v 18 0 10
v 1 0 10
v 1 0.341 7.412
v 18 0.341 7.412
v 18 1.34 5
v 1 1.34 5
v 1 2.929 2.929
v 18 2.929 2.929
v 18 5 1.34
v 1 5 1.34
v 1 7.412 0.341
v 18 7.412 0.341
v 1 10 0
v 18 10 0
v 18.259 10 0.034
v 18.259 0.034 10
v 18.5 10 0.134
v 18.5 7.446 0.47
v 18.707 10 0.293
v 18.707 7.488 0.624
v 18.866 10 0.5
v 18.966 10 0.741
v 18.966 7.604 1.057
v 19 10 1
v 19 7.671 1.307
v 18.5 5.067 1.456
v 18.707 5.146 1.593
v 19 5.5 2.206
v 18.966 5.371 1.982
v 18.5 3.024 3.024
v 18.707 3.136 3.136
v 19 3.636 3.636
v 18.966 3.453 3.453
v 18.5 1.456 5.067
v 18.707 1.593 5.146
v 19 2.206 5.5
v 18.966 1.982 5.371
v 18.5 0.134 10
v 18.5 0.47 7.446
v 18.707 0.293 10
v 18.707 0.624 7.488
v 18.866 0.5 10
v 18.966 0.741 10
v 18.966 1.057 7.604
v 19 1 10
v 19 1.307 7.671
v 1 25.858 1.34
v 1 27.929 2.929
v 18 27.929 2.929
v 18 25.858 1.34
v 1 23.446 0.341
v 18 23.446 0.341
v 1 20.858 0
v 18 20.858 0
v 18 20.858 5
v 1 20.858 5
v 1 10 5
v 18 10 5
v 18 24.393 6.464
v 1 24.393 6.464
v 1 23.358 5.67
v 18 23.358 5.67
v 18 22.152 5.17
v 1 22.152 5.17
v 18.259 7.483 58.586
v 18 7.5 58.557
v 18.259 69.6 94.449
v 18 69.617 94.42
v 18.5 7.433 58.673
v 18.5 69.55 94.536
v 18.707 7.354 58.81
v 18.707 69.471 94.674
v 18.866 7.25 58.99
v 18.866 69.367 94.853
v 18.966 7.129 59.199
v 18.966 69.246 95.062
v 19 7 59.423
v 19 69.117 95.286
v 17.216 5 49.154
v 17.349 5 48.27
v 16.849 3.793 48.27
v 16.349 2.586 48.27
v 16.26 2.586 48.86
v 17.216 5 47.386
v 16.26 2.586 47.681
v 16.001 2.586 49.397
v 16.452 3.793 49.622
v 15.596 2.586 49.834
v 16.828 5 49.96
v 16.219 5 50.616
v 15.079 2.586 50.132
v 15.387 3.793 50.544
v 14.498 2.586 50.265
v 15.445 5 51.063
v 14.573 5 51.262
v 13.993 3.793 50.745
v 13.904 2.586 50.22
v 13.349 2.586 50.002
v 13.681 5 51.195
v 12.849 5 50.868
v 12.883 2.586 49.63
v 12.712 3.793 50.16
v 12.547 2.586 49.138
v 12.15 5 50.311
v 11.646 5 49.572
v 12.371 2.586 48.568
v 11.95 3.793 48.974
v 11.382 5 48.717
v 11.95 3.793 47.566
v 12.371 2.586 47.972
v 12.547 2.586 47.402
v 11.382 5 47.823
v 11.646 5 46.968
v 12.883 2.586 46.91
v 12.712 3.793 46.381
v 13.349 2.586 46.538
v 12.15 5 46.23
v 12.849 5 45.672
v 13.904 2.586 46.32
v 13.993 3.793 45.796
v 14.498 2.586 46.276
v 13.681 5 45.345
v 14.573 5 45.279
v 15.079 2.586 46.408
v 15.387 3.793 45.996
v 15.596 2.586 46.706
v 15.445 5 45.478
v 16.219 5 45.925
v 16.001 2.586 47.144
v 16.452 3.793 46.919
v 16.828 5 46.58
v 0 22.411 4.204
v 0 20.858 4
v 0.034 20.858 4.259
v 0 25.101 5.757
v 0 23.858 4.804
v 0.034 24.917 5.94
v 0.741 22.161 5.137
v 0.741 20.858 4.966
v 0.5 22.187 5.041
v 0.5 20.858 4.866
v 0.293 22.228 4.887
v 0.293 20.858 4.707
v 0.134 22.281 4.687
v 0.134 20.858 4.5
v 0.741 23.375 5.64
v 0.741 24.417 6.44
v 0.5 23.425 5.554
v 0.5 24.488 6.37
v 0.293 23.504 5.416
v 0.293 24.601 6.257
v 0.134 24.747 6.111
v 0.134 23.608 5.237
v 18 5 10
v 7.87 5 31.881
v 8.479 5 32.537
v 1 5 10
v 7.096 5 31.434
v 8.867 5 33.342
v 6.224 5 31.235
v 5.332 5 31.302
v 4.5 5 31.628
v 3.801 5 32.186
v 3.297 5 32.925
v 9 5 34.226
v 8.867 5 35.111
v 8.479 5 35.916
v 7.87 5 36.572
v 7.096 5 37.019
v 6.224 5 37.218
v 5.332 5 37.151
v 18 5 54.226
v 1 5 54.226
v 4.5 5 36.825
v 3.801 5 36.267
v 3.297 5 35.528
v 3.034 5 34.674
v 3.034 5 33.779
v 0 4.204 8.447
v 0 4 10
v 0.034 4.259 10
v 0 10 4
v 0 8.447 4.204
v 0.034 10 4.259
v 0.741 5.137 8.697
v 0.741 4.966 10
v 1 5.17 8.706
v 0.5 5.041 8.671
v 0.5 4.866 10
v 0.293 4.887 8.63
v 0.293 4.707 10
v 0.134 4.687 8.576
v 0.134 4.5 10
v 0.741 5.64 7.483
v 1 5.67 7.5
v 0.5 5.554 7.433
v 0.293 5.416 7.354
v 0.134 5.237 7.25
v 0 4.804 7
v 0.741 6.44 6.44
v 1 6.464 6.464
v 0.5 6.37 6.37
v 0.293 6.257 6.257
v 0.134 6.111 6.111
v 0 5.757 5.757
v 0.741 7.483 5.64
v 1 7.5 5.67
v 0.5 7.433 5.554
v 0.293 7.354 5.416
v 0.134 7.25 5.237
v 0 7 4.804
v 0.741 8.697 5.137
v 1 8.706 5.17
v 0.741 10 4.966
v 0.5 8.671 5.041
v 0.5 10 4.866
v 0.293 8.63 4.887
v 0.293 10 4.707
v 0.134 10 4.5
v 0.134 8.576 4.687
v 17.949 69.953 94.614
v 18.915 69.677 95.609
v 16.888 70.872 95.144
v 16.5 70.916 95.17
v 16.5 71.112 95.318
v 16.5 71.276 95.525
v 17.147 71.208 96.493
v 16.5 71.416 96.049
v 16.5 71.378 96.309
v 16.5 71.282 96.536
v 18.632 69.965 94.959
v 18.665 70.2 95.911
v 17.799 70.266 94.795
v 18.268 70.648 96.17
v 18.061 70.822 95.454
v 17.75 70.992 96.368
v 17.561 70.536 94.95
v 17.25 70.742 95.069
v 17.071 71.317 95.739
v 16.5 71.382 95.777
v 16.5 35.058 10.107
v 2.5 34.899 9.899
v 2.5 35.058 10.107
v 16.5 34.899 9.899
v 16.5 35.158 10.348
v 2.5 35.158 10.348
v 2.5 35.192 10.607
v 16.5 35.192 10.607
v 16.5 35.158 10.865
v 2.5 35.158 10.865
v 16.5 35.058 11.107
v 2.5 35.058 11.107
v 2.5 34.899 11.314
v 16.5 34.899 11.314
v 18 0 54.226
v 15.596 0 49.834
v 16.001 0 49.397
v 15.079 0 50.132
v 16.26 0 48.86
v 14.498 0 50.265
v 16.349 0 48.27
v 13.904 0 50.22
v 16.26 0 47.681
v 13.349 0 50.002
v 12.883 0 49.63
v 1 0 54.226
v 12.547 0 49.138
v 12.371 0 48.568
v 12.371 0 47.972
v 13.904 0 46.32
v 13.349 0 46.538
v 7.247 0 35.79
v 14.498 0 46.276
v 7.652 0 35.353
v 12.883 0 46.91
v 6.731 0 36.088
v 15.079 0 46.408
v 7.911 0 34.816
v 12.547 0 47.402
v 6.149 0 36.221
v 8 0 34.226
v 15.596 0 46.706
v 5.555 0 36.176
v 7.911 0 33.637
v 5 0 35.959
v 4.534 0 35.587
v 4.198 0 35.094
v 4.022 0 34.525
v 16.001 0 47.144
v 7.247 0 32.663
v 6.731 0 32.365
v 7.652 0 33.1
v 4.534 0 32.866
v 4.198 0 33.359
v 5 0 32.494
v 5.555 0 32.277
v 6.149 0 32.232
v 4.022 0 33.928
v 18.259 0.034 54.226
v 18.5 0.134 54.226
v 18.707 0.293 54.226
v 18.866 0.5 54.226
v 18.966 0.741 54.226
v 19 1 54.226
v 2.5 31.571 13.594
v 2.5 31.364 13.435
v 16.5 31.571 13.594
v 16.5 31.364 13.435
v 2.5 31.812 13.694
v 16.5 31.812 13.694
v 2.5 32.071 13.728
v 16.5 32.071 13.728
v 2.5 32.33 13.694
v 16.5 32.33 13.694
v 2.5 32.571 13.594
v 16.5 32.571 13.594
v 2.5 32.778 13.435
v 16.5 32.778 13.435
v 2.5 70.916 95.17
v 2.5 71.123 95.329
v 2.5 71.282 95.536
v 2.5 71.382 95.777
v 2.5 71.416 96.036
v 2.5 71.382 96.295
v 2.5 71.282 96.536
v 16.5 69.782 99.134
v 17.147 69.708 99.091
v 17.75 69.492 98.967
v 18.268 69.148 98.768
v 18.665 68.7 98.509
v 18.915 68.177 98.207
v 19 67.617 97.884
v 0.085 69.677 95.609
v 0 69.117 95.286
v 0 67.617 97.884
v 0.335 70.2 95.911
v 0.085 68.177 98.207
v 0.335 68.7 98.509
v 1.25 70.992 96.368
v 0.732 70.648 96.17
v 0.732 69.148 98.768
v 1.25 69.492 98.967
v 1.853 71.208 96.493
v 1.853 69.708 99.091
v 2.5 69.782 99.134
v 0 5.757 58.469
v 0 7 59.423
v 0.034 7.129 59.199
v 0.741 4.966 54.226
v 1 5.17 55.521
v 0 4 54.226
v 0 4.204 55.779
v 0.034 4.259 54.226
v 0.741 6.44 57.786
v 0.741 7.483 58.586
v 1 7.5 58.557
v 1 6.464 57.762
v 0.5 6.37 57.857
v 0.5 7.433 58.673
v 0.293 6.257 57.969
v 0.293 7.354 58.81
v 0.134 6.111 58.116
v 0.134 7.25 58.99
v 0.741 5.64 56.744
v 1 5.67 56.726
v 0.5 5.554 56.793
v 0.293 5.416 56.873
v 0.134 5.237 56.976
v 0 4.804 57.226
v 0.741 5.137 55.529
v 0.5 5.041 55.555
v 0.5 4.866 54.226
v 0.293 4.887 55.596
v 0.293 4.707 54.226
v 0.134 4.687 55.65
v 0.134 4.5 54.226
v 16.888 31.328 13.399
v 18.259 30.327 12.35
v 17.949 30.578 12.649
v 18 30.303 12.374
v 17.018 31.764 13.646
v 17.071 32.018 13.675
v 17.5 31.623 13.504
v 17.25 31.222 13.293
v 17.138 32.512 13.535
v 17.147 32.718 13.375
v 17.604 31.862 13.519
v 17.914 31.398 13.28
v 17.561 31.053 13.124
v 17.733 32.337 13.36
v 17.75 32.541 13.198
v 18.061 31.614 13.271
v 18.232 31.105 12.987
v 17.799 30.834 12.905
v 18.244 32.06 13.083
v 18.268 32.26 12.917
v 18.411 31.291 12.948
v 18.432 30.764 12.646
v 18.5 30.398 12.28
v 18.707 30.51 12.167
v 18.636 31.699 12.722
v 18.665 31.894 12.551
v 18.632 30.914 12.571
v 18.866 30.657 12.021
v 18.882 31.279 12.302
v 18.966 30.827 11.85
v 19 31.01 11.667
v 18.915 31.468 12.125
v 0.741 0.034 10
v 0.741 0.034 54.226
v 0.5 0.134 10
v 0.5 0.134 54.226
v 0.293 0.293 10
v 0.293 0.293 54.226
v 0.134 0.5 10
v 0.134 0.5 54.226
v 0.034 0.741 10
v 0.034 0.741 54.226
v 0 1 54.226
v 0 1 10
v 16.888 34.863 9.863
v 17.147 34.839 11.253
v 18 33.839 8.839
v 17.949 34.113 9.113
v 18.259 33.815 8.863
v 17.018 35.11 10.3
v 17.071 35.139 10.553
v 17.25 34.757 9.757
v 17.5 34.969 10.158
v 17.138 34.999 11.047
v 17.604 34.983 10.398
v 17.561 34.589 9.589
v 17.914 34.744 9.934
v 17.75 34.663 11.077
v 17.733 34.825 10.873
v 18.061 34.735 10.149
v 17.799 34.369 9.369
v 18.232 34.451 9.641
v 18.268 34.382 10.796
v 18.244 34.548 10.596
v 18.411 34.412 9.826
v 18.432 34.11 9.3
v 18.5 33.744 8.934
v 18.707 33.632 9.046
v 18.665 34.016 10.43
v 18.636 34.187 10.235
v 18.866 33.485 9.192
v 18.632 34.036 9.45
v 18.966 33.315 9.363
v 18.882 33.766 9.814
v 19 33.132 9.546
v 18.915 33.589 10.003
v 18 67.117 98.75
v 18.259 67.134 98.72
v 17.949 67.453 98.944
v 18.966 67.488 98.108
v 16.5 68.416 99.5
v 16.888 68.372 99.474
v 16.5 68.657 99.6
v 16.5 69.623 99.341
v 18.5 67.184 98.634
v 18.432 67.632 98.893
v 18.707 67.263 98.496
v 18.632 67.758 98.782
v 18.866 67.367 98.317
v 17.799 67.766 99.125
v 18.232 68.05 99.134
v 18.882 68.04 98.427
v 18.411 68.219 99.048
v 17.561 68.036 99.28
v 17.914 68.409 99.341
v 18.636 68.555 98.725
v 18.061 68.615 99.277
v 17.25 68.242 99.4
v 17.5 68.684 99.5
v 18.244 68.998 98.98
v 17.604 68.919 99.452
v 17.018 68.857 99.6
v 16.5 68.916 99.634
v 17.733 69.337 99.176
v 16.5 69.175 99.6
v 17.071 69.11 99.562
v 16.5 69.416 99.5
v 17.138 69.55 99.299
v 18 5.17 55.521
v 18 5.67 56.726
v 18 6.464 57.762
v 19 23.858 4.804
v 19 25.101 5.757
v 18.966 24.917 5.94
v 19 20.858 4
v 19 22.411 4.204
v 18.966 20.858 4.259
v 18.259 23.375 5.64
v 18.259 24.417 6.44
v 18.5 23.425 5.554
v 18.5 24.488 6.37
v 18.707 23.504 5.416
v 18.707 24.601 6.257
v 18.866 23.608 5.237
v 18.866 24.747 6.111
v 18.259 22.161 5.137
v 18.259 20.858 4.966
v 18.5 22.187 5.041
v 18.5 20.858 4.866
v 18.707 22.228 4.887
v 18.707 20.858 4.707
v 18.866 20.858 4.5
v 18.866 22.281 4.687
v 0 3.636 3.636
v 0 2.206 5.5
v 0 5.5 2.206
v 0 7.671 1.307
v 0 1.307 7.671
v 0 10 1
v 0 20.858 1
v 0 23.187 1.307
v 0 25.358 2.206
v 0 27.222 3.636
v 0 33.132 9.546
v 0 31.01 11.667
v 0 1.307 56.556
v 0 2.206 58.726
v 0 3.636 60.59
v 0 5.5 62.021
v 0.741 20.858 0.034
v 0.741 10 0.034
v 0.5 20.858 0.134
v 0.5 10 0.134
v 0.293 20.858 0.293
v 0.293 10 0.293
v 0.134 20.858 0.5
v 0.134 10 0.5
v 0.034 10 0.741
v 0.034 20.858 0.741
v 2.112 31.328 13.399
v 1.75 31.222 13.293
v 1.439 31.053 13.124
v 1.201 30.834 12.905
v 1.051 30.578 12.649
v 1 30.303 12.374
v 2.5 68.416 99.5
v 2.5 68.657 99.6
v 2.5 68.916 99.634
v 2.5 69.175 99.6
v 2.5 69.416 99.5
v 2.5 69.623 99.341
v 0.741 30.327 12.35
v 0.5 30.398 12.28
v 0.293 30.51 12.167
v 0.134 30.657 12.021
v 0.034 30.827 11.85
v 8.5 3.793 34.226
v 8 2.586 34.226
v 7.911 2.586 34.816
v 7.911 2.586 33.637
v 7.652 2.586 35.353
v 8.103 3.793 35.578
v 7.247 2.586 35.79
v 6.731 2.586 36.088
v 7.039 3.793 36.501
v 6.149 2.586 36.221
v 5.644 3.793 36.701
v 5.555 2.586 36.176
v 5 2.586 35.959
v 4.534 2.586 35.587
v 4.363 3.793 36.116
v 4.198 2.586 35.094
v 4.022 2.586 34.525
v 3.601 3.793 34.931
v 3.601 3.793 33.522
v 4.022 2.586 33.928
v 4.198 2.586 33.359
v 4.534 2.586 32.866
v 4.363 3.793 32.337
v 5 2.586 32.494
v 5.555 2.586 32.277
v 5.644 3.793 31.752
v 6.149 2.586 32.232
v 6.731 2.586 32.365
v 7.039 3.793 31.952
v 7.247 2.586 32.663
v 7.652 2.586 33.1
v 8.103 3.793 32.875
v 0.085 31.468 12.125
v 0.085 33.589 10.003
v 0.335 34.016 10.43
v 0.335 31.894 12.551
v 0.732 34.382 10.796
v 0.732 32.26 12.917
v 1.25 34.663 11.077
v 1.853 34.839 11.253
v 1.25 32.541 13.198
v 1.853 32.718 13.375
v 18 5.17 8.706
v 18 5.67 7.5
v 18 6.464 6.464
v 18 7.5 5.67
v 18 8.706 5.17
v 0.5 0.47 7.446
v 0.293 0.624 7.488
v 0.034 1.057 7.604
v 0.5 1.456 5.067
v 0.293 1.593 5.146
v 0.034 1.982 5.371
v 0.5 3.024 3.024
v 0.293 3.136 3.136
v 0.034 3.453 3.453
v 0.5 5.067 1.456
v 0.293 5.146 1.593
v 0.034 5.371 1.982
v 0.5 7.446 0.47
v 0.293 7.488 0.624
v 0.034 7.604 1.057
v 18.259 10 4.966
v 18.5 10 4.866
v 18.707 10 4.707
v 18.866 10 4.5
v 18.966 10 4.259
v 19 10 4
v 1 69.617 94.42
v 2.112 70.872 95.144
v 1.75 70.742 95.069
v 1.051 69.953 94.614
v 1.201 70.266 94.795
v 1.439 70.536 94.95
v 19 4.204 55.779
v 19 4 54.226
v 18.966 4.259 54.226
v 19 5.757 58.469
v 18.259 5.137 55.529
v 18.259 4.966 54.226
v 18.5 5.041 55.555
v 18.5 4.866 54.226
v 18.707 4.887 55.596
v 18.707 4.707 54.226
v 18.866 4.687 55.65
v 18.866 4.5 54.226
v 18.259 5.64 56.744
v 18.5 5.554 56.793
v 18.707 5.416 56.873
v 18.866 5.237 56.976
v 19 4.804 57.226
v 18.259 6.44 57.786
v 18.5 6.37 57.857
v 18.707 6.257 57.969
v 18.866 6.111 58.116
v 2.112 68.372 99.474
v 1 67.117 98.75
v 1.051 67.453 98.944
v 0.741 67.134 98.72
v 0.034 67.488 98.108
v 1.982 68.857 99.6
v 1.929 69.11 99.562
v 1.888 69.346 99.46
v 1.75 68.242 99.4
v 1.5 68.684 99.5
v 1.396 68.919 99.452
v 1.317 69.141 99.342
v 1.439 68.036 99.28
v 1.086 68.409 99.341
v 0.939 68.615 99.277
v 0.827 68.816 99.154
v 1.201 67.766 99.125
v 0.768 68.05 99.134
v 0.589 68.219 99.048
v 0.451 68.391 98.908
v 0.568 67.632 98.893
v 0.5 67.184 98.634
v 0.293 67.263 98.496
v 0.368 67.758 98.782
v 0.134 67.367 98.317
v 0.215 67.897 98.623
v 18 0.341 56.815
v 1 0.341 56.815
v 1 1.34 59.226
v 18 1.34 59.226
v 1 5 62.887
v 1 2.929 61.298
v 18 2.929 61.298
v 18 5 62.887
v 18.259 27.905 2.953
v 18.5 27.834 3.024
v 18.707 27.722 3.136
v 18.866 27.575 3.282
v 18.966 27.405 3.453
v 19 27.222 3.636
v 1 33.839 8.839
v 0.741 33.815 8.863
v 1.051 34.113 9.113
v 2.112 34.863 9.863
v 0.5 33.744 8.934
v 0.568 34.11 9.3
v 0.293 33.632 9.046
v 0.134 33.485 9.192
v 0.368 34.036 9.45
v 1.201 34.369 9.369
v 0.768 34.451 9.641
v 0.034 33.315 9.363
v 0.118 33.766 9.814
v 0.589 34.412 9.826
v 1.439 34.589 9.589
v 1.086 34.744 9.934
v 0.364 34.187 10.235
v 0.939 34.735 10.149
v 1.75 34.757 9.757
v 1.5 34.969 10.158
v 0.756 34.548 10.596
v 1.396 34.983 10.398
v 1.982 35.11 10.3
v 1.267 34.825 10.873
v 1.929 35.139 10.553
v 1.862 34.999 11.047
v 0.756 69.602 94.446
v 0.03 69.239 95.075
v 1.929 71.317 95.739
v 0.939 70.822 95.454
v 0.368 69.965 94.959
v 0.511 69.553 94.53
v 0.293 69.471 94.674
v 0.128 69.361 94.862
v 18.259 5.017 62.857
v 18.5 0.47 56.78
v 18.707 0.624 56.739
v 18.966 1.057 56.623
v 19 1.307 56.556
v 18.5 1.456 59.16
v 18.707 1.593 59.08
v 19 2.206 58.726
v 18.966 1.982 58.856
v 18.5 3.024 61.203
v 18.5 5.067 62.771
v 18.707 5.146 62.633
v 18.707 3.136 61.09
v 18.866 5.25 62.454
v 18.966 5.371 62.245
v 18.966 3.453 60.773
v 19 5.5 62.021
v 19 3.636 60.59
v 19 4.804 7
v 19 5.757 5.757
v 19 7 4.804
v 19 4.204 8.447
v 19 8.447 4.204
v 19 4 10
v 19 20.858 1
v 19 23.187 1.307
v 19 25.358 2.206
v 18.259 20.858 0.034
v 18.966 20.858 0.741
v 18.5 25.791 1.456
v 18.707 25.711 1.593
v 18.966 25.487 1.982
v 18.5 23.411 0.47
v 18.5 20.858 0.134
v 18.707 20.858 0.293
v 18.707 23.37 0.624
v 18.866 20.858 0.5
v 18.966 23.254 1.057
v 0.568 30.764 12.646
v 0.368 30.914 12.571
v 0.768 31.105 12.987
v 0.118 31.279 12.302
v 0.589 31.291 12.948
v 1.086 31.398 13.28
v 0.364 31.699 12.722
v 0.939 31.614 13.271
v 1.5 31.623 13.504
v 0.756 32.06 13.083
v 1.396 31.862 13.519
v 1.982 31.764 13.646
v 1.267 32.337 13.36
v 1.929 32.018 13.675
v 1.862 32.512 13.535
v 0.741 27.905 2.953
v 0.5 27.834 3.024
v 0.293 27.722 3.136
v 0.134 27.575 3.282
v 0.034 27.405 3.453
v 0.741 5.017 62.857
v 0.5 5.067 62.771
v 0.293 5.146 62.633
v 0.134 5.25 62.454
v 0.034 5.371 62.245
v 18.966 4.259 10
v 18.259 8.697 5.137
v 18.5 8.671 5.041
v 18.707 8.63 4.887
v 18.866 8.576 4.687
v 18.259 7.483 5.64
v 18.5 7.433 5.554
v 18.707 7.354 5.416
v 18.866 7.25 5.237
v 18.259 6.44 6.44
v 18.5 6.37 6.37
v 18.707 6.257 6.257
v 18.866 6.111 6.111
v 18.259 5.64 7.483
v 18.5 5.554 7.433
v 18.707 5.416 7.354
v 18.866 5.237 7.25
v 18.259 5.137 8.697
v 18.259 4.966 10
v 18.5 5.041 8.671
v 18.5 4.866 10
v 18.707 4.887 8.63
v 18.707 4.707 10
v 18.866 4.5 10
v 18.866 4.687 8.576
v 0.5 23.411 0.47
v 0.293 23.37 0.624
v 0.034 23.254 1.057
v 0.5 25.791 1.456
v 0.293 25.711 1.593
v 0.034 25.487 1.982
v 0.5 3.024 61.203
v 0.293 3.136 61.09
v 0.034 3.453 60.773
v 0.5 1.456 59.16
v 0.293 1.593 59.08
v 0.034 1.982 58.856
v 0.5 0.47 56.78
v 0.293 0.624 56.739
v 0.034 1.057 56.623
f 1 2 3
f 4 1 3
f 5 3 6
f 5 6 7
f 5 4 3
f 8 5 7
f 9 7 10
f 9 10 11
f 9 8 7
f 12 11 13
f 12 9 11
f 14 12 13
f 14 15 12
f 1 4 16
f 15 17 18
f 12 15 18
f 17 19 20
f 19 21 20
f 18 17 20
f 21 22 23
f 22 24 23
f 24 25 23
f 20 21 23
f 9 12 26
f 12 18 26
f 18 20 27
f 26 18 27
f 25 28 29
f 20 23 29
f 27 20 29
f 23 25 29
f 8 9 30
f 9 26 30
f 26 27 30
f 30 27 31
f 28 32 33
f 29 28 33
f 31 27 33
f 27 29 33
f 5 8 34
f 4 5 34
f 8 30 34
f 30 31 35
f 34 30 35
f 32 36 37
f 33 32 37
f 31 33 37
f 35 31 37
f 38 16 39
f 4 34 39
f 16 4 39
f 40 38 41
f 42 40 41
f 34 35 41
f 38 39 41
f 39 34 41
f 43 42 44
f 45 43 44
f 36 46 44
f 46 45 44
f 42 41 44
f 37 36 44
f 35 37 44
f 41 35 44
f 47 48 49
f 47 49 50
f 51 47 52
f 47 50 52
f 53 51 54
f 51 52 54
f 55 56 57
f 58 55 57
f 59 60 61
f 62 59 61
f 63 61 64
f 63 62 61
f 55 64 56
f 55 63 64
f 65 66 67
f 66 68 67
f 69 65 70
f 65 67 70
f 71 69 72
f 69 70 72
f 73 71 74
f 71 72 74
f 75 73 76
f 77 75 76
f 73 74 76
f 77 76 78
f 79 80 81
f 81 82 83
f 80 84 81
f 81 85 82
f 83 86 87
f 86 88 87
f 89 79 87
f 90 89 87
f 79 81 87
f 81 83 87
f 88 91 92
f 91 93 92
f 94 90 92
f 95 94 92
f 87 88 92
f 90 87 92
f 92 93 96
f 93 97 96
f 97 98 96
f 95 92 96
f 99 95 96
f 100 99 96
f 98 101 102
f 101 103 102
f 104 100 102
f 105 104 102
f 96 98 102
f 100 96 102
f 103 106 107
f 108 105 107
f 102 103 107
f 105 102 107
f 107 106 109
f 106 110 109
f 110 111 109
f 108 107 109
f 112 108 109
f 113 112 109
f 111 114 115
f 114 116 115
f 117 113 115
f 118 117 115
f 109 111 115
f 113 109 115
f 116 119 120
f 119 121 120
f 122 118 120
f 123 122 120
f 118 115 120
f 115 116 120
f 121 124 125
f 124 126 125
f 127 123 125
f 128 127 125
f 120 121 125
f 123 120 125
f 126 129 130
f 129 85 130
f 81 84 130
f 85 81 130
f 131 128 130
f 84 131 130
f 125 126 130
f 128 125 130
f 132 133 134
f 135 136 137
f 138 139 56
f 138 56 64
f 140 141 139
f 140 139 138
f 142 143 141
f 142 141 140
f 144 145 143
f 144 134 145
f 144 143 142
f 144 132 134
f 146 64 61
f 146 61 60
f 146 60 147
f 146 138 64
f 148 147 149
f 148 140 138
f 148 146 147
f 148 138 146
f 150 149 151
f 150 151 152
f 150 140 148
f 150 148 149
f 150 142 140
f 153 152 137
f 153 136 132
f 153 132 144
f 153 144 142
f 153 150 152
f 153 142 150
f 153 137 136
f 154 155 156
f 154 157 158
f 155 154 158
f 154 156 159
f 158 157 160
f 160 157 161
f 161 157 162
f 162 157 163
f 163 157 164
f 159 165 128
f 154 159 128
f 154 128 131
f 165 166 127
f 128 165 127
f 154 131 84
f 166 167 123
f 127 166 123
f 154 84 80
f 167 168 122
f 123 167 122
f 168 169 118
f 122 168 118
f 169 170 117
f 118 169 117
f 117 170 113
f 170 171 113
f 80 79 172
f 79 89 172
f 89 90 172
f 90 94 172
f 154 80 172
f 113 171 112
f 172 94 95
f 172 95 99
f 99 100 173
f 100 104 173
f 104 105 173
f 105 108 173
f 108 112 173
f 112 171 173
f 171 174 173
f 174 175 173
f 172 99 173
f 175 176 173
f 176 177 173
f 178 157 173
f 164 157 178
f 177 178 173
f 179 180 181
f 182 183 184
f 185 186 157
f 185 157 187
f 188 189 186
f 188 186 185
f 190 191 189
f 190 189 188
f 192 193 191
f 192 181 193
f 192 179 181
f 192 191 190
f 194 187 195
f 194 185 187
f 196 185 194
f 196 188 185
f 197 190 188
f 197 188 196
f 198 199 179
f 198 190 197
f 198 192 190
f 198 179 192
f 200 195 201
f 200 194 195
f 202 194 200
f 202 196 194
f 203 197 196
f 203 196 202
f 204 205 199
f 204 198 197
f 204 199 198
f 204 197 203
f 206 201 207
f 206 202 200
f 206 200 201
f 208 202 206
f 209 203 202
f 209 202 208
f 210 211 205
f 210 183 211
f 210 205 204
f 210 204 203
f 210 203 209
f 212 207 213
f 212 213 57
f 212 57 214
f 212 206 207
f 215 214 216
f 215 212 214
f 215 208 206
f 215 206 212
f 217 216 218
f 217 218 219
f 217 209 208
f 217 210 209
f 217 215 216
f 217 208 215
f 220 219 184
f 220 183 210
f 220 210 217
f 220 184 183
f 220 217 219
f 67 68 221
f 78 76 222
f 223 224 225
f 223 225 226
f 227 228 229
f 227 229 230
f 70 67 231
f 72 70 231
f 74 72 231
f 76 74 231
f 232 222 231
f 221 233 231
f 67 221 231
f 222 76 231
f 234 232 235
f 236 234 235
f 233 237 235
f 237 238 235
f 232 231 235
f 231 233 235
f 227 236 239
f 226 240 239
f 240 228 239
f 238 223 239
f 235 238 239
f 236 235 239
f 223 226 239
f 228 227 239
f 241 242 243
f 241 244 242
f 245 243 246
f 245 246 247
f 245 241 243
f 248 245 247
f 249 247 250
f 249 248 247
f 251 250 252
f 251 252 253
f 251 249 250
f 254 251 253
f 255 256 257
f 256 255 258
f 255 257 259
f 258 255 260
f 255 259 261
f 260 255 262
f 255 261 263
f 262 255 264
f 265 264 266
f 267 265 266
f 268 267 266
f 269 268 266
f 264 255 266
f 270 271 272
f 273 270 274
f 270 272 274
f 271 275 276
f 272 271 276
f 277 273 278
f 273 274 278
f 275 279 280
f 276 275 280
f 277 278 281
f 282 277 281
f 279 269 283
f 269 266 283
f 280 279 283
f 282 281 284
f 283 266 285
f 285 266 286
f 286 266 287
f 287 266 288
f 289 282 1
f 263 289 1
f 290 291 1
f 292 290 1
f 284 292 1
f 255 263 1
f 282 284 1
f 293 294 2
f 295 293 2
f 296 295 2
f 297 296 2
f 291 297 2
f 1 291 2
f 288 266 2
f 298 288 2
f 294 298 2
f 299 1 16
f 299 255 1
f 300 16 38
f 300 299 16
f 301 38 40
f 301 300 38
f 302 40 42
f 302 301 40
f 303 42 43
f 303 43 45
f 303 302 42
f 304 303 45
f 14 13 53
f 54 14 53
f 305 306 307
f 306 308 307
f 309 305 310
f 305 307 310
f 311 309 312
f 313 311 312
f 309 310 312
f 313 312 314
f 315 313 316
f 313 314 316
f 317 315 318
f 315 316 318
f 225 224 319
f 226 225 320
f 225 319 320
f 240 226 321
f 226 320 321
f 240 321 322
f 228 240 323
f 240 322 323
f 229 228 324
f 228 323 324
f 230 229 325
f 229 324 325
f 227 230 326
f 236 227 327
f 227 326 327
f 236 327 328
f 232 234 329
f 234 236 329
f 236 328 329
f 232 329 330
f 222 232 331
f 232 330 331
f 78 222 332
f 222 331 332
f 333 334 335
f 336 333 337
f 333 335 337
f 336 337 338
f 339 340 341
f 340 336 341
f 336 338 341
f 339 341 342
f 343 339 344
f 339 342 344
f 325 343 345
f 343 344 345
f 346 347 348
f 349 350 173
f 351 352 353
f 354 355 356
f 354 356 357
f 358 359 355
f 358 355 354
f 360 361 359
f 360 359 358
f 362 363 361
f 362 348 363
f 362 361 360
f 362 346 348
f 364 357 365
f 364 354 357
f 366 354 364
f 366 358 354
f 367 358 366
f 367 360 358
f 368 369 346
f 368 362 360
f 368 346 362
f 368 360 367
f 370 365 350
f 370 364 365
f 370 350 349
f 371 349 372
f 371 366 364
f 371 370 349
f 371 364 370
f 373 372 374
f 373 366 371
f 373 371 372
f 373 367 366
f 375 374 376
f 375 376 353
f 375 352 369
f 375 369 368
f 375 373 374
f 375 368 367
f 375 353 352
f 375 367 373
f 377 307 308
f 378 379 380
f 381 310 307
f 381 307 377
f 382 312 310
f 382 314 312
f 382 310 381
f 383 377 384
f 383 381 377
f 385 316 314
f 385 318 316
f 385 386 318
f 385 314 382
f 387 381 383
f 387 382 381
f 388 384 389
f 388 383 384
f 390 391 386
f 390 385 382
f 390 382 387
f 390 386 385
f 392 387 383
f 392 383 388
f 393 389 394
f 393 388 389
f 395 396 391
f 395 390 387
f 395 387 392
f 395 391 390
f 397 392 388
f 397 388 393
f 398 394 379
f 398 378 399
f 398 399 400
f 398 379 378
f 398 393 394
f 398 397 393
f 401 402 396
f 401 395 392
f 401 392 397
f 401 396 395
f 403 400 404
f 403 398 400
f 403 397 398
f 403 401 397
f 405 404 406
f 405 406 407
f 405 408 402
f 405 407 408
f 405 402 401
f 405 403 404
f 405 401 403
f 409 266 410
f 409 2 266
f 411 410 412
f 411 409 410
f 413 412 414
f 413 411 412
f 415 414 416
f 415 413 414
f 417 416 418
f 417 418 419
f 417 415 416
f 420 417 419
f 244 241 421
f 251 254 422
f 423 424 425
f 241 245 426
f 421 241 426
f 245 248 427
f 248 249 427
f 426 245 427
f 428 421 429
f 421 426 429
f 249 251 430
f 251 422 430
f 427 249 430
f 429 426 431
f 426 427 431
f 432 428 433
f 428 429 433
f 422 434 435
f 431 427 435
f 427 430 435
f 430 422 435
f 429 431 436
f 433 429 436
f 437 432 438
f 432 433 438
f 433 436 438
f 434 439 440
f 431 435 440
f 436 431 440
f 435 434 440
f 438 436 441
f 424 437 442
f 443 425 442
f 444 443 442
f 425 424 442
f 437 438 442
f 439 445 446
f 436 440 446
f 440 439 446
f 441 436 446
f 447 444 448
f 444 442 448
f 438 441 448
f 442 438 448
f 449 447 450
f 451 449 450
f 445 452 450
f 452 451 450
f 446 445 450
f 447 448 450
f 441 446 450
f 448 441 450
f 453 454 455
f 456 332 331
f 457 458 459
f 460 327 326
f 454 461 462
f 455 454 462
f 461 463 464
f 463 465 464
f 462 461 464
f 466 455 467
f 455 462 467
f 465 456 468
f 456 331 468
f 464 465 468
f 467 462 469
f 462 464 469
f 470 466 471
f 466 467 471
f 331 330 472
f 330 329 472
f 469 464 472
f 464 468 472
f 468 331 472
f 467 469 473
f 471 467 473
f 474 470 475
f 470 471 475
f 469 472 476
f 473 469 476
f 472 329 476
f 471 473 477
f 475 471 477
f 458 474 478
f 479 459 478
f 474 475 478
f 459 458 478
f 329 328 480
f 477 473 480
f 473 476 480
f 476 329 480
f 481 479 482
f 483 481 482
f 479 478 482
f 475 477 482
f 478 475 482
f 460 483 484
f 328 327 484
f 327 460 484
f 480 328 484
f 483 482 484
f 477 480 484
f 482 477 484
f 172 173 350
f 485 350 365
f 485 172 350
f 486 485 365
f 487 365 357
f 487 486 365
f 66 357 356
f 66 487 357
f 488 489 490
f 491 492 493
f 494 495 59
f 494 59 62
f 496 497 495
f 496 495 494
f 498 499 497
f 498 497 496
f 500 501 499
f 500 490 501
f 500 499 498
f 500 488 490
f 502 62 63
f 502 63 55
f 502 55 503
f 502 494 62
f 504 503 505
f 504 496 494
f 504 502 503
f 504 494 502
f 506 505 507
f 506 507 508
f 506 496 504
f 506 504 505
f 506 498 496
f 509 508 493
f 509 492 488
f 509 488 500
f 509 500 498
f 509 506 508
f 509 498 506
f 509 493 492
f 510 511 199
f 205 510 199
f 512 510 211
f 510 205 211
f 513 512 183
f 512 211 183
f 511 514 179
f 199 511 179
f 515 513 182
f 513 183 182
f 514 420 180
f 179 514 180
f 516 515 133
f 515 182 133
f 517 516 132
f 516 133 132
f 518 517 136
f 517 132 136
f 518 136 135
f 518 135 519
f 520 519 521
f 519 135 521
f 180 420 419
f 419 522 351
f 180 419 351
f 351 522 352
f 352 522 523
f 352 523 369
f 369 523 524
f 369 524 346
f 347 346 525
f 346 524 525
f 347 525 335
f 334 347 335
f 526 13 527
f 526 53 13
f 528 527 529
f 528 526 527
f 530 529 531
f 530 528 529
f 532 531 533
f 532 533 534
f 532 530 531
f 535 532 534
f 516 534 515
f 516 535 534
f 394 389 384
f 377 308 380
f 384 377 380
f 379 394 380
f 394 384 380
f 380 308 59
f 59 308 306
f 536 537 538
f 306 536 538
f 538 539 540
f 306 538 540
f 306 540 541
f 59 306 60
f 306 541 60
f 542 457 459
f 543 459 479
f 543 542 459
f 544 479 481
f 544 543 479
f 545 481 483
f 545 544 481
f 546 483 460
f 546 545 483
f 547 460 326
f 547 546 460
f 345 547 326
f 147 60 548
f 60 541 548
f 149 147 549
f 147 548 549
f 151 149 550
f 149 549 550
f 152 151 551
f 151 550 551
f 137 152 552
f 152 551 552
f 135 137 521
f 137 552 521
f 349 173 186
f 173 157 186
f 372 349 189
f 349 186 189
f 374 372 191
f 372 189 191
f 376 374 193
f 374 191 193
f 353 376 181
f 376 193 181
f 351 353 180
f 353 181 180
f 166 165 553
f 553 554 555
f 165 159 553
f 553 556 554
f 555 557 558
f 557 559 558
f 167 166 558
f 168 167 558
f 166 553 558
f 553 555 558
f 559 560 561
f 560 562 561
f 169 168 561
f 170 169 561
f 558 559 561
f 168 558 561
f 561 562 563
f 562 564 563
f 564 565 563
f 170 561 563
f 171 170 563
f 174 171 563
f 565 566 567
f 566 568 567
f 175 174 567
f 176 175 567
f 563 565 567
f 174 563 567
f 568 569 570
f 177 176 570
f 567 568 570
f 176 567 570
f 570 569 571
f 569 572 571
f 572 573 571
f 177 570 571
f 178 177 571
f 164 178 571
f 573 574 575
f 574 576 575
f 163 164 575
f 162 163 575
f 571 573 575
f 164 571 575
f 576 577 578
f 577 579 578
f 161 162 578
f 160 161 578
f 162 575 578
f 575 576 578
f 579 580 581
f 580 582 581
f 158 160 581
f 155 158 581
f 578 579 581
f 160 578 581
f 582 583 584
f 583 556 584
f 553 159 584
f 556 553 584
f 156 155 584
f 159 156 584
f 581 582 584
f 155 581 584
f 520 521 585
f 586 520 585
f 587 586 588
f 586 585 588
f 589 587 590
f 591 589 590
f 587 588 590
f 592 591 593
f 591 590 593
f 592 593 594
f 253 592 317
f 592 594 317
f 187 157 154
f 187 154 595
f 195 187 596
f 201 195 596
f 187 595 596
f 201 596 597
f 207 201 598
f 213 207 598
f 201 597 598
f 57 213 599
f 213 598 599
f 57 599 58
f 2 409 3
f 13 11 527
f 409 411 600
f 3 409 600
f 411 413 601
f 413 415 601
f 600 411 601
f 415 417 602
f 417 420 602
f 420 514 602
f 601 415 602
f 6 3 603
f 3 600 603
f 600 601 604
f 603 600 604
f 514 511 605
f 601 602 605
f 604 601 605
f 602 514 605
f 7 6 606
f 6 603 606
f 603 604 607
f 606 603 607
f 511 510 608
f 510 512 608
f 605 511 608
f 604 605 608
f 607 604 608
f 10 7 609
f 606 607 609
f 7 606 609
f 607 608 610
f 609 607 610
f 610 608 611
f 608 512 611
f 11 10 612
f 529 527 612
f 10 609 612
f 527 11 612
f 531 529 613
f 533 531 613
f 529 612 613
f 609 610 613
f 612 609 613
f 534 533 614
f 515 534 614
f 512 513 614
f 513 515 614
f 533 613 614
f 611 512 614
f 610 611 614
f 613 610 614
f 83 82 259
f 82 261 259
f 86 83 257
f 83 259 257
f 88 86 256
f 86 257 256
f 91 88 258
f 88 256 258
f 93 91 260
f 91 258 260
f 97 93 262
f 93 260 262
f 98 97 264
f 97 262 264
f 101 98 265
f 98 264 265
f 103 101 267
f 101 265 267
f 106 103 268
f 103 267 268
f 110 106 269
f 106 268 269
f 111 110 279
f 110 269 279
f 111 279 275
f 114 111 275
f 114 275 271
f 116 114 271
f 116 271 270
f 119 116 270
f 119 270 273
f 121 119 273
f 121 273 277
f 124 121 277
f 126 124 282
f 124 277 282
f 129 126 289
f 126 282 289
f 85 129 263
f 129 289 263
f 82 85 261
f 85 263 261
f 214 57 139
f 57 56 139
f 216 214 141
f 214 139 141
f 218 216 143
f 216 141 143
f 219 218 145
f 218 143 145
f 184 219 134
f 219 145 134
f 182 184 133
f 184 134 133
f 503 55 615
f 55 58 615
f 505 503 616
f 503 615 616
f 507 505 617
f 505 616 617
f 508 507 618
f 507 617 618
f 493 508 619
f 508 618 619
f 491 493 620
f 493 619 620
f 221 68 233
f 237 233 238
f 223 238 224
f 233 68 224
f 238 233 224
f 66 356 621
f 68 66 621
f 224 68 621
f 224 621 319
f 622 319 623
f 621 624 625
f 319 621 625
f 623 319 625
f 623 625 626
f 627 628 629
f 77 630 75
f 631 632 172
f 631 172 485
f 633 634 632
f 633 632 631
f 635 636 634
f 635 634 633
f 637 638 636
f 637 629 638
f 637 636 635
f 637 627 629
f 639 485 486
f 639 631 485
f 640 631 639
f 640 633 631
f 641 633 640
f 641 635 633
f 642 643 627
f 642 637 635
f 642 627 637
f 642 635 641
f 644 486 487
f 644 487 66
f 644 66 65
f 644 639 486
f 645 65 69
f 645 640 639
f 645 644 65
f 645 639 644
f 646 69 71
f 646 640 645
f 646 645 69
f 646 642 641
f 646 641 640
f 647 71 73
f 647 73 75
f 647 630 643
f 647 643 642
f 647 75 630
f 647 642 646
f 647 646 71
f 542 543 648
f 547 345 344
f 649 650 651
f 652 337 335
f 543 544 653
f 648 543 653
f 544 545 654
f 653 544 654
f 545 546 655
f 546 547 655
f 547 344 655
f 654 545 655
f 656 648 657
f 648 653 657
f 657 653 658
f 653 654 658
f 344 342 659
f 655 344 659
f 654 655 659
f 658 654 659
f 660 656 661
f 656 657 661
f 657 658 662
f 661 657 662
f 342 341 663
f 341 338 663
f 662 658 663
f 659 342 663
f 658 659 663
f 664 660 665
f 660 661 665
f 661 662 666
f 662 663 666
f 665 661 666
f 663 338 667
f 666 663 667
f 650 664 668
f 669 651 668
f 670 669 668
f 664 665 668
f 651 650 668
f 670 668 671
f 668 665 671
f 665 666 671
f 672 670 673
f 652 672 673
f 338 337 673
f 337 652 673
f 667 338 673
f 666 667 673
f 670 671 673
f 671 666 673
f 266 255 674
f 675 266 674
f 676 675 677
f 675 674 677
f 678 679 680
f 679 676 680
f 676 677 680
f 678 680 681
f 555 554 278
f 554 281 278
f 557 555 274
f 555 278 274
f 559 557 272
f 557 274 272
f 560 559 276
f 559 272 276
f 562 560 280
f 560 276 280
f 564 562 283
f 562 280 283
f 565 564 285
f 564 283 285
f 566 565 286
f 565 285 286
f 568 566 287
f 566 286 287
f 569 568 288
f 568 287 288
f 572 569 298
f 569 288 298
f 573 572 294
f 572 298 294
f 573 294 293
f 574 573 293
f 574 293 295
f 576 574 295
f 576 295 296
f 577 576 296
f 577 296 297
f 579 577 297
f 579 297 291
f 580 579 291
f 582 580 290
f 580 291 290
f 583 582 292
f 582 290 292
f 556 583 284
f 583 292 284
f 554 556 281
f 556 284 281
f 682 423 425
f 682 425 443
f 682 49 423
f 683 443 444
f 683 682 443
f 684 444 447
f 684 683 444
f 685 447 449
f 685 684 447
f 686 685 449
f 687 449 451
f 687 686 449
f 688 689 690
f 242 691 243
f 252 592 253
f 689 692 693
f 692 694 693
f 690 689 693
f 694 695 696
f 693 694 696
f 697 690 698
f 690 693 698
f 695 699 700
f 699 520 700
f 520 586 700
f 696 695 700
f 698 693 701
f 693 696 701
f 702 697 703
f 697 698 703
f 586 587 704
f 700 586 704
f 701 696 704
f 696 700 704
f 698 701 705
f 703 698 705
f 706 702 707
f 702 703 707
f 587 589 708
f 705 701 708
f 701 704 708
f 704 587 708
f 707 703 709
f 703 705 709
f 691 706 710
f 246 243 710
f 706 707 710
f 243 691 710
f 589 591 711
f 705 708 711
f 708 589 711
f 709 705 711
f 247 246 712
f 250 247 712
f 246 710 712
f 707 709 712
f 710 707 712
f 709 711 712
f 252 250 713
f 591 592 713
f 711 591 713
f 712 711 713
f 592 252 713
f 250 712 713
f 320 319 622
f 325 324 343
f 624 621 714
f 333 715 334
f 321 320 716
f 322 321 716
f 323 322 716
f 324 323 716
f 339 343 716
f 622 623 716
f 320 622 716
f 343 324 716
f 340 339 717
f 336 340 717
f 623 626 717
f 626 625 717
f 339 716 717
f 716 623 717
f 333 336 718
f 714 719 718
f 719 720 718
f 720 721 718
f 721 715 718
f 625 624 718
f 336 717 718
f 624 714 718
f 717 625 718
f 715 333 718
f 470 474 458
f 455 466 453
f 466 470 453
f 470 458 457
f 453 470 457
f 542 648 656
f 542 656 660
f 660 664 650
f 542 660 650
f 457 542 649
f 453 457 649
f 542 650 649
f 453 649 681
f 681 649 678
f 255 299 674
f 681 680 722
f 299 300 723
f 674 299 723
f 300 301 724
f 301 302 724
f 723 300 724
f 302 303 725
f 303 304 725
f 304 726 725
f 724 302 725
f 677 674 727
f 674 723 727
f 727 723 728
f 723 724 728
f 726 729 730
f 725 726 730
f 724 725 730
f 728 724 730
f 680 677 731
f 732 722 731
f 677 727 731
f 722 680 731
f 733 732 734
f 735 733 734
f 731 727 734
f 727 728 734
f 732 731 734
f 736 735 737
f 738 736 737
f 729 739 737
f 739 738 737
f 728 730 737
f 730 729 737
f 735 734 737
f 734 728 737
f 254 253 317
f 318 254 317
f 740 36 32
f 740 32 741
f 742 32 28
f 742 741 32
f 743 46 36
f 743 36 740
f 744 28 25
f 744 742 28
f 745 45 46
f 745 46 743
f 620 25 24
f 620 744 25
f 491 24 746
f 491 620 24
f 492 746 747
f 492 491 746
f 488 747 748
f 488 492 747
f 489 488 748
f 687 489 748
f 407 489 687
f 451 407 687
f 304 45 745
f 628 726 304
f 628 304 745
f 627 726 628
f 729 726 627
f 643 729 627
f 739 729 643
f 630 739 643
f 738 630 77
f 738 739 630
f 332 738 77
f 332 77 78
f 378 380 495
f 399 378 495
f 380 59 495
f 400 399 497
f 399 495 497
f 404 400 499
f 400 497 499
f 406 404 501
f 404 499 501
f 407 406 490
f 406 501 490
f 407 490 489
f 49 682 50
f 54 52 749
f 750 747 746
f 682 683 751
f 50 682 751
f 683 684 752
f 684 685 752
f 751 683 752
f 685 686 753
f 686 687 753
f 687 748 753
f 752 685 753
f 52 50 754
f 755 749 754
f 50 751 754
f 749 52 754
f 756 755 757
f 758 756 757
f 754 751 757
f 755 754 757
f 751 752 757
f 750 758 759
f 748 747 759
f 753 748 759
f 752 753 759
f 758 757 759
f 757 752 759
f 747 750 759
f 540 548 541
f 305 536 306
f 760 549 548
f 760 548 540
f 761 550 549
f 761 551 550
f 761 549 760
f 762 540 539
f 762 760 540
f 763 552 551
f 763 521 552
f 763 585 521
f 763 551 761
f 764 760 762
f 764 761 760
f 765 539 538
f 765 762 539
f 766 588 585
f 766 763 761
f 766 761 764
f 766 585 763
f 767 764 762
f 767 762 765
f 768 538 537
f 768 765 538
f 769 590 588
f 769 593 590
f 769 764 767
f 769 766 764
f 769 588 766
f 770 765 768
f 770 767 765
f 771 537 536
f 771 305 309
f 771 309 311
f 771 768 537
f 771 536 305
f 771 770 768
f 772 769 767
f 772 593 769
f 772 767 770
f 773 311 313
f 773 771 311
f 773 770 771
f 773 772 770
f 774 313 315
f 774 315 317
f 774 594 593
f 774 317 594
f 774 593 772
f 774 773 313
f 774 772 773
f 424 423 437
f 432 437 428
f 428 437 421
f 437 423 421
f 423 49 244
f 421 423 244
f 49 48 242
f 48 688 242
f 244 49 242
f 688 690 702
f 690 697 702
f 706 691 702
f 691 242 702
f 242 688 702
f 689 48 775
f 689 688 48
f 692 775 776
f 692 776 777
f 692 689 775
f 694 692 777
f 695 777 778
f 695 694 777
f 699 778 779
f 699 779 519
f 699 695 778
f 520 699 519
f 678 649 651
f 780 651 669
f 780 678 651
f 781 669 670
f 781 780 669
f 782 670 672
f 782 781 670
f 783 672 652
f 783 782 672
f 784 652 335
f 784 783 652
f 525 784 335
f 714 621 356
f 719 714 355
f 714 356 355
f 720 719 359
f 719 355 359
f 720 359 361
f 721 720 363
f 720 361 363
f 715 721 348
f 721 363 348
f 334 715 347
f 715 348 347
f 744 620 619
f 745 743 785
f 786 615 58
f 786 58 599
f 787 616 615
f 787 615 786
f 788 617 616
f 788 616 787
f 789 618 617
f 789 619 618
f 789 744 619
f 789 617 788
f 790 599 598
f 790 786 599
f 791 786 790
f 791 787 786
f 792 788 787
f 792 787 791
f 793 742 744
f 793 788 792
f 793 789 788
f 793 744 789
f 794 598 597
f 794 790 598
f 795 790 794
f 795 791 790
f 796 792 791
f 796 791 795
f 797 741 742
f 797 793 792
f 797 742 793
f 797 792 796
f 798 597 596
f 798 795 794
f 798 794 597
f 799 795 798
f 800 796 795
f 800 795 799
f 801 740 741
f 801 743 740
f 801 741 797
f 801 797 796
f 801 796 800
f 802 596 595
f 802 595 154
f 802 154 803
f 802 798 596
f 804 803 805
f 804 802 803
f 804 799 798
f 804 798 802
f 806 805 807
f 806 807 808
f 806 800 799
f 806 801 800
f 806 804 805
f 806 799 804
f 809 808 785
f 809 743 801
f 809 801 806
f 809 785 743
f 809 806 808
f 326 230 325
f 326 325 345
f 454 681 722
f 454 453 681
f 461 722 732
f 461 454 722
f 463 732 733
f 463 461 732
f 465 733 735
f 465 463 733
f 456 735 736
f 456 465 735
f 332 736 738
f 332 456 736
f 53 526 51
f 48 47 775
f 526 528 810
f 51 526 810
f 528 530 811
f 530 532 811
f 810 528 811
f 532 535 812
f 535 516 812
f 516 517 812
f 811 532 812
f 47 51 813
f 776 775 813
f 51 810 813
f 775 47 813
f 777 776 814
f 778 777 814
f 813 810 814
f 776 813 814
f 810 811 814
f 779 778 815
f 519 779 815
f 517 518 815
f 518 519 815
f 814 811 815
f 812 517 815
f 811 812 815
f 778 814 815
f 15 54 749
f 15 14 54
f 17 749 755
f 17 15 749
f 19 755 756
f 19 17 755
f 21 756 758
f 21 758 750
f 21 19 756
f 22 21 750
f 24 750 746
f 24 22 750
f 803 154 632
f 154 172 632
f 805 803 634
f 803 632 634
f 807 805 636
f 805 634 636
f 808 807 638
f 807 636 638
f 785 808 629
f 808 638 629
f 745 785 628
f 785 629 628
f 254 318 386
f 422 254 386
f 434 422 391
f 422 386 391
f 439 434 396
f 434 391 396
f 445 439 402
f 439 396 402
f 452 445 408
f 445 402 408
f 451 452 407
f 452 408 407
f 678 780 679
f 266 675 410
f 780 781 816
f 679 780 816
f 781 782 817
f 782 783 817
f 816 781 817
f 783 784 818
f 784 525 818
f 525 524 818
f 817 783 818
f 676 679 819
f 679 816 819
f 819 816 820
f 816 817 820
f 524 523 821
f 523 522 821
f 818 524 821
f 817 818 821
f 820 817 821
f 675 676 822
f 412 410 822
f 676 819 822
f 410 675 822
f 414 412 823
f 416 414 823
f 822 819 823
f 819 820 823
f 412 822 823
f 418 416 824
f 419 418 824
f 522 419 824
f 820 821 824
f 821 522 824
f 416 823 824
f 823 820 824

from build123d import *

# Parameters (mm, degrees)
F1_DEPTH        = 19
F2_R            = 10
F3_R            = 10
F4_R            = 5
F5_R            = 5
F6_R            = 10
F7_R            = 5
F8_R            = 2.5
F9_R            = 1
F11_D           = 4
F11_CSINK_D     = 6
F11_CSINK_ANGLE = 45
F12_D           = 4
F12_CSINK_D     = 6
F12_CSINK_ANGLE = 45


with BuildPart() as f1:
    # F0 (on Right) → F1 (new body)
    with BuildSketch(Plane.YZ):
        Polygon((0, 60), (0, 0), (25, 0), (35.606602, 10.606602), (32.071068, 14.142136), (22.928932, 5), (5, 5), (5, 57.113249), (71.782032, 95.669873), (69.282032, 100), align=None)
    extrude(amount=F1_DEPTH)

    # F2
    f2_edges = [f1.edges().sort_by_distance(p)[0] for p in [
        (9.5, 0, 60),
    ]]
    fillet(f2_edges, radius=F2_R)

    # F3
    f3_edges = [f1.edges().sort_by_distance(p)[0] for p in [
        (9.5, 0, 0),
    ]]
    fillet(f3_edges, radius=F3_R)

    # F4
    f4_edges = [f1.edges().sort_by_distance(p)[0] for p in [
        (9.5, 5, 5),
    ]]
    fillet(f4_edges, radius=F4_R)

    # F5
    f5_edges = [f1.edges().sort_by_distance(p)[0] for p in [
        (9.5, 5, 57.113249),
    ]]
    fillet(f5_edges, radius=F5_R)

    # F6
    f6_edges = [f1.edges().sort_by_distance(p)[0] for p in [
        (9.5, 25, 0),
    ]]
    fillet(f6_edges, radius=F6_R)

    # F7
    f7_edges = [f1.edges().sort_by_distance(p)[0] for p in [
        (9.5, 22.928932, 5),
    ]]
    fillet(f7_edges, radius=F7_R)

    # F8
    f8_edges = [f1.edges().sort_by_distance(p)[0] for p in [
        (19, 33.838835, 12.374369),
        (0, 33.838835, 12.374369),
        (0, 70.532032, 97.834936),
        (19, 70.532032, 97.834936),
    ]]
    fillet(f8_edges, radius=F8_R)

    # F9
    f9_edges = [f1.edges().sort_by_distance(p)[0] for p in [
        (9.5, 35.606602, 10.606602),
        (9.5, 32.071068, 14.142136),
    ]]
    fillet(f9_edges, radius=F9_R)

    # F11 (through all)
    with Locations(Plane(origin=(0, 5, 0), x_dir=(-1, 0, 0), z_dir=(0, 1, 0))):
        with Locations((-14.348798, 48.270144)):
            CounterSinkHole(F11_D / 2, F11_CSINK_D / 2, counter_sink_angle=F11_CSINK_ANGLE)

    # F12 (through all)
    with Locations(Plane(origin=(0, 5, 0), x_dir=(-1, 0, 0), z_dir=(0, 1, 0))):
        with Locations((-6, 34.226497)):
            CounterSinkHole(F12_D / 2, F12_CSINK_D / 2, counter_sink_angle=F12_CSINK_ANGLE)


solid = f1.part
